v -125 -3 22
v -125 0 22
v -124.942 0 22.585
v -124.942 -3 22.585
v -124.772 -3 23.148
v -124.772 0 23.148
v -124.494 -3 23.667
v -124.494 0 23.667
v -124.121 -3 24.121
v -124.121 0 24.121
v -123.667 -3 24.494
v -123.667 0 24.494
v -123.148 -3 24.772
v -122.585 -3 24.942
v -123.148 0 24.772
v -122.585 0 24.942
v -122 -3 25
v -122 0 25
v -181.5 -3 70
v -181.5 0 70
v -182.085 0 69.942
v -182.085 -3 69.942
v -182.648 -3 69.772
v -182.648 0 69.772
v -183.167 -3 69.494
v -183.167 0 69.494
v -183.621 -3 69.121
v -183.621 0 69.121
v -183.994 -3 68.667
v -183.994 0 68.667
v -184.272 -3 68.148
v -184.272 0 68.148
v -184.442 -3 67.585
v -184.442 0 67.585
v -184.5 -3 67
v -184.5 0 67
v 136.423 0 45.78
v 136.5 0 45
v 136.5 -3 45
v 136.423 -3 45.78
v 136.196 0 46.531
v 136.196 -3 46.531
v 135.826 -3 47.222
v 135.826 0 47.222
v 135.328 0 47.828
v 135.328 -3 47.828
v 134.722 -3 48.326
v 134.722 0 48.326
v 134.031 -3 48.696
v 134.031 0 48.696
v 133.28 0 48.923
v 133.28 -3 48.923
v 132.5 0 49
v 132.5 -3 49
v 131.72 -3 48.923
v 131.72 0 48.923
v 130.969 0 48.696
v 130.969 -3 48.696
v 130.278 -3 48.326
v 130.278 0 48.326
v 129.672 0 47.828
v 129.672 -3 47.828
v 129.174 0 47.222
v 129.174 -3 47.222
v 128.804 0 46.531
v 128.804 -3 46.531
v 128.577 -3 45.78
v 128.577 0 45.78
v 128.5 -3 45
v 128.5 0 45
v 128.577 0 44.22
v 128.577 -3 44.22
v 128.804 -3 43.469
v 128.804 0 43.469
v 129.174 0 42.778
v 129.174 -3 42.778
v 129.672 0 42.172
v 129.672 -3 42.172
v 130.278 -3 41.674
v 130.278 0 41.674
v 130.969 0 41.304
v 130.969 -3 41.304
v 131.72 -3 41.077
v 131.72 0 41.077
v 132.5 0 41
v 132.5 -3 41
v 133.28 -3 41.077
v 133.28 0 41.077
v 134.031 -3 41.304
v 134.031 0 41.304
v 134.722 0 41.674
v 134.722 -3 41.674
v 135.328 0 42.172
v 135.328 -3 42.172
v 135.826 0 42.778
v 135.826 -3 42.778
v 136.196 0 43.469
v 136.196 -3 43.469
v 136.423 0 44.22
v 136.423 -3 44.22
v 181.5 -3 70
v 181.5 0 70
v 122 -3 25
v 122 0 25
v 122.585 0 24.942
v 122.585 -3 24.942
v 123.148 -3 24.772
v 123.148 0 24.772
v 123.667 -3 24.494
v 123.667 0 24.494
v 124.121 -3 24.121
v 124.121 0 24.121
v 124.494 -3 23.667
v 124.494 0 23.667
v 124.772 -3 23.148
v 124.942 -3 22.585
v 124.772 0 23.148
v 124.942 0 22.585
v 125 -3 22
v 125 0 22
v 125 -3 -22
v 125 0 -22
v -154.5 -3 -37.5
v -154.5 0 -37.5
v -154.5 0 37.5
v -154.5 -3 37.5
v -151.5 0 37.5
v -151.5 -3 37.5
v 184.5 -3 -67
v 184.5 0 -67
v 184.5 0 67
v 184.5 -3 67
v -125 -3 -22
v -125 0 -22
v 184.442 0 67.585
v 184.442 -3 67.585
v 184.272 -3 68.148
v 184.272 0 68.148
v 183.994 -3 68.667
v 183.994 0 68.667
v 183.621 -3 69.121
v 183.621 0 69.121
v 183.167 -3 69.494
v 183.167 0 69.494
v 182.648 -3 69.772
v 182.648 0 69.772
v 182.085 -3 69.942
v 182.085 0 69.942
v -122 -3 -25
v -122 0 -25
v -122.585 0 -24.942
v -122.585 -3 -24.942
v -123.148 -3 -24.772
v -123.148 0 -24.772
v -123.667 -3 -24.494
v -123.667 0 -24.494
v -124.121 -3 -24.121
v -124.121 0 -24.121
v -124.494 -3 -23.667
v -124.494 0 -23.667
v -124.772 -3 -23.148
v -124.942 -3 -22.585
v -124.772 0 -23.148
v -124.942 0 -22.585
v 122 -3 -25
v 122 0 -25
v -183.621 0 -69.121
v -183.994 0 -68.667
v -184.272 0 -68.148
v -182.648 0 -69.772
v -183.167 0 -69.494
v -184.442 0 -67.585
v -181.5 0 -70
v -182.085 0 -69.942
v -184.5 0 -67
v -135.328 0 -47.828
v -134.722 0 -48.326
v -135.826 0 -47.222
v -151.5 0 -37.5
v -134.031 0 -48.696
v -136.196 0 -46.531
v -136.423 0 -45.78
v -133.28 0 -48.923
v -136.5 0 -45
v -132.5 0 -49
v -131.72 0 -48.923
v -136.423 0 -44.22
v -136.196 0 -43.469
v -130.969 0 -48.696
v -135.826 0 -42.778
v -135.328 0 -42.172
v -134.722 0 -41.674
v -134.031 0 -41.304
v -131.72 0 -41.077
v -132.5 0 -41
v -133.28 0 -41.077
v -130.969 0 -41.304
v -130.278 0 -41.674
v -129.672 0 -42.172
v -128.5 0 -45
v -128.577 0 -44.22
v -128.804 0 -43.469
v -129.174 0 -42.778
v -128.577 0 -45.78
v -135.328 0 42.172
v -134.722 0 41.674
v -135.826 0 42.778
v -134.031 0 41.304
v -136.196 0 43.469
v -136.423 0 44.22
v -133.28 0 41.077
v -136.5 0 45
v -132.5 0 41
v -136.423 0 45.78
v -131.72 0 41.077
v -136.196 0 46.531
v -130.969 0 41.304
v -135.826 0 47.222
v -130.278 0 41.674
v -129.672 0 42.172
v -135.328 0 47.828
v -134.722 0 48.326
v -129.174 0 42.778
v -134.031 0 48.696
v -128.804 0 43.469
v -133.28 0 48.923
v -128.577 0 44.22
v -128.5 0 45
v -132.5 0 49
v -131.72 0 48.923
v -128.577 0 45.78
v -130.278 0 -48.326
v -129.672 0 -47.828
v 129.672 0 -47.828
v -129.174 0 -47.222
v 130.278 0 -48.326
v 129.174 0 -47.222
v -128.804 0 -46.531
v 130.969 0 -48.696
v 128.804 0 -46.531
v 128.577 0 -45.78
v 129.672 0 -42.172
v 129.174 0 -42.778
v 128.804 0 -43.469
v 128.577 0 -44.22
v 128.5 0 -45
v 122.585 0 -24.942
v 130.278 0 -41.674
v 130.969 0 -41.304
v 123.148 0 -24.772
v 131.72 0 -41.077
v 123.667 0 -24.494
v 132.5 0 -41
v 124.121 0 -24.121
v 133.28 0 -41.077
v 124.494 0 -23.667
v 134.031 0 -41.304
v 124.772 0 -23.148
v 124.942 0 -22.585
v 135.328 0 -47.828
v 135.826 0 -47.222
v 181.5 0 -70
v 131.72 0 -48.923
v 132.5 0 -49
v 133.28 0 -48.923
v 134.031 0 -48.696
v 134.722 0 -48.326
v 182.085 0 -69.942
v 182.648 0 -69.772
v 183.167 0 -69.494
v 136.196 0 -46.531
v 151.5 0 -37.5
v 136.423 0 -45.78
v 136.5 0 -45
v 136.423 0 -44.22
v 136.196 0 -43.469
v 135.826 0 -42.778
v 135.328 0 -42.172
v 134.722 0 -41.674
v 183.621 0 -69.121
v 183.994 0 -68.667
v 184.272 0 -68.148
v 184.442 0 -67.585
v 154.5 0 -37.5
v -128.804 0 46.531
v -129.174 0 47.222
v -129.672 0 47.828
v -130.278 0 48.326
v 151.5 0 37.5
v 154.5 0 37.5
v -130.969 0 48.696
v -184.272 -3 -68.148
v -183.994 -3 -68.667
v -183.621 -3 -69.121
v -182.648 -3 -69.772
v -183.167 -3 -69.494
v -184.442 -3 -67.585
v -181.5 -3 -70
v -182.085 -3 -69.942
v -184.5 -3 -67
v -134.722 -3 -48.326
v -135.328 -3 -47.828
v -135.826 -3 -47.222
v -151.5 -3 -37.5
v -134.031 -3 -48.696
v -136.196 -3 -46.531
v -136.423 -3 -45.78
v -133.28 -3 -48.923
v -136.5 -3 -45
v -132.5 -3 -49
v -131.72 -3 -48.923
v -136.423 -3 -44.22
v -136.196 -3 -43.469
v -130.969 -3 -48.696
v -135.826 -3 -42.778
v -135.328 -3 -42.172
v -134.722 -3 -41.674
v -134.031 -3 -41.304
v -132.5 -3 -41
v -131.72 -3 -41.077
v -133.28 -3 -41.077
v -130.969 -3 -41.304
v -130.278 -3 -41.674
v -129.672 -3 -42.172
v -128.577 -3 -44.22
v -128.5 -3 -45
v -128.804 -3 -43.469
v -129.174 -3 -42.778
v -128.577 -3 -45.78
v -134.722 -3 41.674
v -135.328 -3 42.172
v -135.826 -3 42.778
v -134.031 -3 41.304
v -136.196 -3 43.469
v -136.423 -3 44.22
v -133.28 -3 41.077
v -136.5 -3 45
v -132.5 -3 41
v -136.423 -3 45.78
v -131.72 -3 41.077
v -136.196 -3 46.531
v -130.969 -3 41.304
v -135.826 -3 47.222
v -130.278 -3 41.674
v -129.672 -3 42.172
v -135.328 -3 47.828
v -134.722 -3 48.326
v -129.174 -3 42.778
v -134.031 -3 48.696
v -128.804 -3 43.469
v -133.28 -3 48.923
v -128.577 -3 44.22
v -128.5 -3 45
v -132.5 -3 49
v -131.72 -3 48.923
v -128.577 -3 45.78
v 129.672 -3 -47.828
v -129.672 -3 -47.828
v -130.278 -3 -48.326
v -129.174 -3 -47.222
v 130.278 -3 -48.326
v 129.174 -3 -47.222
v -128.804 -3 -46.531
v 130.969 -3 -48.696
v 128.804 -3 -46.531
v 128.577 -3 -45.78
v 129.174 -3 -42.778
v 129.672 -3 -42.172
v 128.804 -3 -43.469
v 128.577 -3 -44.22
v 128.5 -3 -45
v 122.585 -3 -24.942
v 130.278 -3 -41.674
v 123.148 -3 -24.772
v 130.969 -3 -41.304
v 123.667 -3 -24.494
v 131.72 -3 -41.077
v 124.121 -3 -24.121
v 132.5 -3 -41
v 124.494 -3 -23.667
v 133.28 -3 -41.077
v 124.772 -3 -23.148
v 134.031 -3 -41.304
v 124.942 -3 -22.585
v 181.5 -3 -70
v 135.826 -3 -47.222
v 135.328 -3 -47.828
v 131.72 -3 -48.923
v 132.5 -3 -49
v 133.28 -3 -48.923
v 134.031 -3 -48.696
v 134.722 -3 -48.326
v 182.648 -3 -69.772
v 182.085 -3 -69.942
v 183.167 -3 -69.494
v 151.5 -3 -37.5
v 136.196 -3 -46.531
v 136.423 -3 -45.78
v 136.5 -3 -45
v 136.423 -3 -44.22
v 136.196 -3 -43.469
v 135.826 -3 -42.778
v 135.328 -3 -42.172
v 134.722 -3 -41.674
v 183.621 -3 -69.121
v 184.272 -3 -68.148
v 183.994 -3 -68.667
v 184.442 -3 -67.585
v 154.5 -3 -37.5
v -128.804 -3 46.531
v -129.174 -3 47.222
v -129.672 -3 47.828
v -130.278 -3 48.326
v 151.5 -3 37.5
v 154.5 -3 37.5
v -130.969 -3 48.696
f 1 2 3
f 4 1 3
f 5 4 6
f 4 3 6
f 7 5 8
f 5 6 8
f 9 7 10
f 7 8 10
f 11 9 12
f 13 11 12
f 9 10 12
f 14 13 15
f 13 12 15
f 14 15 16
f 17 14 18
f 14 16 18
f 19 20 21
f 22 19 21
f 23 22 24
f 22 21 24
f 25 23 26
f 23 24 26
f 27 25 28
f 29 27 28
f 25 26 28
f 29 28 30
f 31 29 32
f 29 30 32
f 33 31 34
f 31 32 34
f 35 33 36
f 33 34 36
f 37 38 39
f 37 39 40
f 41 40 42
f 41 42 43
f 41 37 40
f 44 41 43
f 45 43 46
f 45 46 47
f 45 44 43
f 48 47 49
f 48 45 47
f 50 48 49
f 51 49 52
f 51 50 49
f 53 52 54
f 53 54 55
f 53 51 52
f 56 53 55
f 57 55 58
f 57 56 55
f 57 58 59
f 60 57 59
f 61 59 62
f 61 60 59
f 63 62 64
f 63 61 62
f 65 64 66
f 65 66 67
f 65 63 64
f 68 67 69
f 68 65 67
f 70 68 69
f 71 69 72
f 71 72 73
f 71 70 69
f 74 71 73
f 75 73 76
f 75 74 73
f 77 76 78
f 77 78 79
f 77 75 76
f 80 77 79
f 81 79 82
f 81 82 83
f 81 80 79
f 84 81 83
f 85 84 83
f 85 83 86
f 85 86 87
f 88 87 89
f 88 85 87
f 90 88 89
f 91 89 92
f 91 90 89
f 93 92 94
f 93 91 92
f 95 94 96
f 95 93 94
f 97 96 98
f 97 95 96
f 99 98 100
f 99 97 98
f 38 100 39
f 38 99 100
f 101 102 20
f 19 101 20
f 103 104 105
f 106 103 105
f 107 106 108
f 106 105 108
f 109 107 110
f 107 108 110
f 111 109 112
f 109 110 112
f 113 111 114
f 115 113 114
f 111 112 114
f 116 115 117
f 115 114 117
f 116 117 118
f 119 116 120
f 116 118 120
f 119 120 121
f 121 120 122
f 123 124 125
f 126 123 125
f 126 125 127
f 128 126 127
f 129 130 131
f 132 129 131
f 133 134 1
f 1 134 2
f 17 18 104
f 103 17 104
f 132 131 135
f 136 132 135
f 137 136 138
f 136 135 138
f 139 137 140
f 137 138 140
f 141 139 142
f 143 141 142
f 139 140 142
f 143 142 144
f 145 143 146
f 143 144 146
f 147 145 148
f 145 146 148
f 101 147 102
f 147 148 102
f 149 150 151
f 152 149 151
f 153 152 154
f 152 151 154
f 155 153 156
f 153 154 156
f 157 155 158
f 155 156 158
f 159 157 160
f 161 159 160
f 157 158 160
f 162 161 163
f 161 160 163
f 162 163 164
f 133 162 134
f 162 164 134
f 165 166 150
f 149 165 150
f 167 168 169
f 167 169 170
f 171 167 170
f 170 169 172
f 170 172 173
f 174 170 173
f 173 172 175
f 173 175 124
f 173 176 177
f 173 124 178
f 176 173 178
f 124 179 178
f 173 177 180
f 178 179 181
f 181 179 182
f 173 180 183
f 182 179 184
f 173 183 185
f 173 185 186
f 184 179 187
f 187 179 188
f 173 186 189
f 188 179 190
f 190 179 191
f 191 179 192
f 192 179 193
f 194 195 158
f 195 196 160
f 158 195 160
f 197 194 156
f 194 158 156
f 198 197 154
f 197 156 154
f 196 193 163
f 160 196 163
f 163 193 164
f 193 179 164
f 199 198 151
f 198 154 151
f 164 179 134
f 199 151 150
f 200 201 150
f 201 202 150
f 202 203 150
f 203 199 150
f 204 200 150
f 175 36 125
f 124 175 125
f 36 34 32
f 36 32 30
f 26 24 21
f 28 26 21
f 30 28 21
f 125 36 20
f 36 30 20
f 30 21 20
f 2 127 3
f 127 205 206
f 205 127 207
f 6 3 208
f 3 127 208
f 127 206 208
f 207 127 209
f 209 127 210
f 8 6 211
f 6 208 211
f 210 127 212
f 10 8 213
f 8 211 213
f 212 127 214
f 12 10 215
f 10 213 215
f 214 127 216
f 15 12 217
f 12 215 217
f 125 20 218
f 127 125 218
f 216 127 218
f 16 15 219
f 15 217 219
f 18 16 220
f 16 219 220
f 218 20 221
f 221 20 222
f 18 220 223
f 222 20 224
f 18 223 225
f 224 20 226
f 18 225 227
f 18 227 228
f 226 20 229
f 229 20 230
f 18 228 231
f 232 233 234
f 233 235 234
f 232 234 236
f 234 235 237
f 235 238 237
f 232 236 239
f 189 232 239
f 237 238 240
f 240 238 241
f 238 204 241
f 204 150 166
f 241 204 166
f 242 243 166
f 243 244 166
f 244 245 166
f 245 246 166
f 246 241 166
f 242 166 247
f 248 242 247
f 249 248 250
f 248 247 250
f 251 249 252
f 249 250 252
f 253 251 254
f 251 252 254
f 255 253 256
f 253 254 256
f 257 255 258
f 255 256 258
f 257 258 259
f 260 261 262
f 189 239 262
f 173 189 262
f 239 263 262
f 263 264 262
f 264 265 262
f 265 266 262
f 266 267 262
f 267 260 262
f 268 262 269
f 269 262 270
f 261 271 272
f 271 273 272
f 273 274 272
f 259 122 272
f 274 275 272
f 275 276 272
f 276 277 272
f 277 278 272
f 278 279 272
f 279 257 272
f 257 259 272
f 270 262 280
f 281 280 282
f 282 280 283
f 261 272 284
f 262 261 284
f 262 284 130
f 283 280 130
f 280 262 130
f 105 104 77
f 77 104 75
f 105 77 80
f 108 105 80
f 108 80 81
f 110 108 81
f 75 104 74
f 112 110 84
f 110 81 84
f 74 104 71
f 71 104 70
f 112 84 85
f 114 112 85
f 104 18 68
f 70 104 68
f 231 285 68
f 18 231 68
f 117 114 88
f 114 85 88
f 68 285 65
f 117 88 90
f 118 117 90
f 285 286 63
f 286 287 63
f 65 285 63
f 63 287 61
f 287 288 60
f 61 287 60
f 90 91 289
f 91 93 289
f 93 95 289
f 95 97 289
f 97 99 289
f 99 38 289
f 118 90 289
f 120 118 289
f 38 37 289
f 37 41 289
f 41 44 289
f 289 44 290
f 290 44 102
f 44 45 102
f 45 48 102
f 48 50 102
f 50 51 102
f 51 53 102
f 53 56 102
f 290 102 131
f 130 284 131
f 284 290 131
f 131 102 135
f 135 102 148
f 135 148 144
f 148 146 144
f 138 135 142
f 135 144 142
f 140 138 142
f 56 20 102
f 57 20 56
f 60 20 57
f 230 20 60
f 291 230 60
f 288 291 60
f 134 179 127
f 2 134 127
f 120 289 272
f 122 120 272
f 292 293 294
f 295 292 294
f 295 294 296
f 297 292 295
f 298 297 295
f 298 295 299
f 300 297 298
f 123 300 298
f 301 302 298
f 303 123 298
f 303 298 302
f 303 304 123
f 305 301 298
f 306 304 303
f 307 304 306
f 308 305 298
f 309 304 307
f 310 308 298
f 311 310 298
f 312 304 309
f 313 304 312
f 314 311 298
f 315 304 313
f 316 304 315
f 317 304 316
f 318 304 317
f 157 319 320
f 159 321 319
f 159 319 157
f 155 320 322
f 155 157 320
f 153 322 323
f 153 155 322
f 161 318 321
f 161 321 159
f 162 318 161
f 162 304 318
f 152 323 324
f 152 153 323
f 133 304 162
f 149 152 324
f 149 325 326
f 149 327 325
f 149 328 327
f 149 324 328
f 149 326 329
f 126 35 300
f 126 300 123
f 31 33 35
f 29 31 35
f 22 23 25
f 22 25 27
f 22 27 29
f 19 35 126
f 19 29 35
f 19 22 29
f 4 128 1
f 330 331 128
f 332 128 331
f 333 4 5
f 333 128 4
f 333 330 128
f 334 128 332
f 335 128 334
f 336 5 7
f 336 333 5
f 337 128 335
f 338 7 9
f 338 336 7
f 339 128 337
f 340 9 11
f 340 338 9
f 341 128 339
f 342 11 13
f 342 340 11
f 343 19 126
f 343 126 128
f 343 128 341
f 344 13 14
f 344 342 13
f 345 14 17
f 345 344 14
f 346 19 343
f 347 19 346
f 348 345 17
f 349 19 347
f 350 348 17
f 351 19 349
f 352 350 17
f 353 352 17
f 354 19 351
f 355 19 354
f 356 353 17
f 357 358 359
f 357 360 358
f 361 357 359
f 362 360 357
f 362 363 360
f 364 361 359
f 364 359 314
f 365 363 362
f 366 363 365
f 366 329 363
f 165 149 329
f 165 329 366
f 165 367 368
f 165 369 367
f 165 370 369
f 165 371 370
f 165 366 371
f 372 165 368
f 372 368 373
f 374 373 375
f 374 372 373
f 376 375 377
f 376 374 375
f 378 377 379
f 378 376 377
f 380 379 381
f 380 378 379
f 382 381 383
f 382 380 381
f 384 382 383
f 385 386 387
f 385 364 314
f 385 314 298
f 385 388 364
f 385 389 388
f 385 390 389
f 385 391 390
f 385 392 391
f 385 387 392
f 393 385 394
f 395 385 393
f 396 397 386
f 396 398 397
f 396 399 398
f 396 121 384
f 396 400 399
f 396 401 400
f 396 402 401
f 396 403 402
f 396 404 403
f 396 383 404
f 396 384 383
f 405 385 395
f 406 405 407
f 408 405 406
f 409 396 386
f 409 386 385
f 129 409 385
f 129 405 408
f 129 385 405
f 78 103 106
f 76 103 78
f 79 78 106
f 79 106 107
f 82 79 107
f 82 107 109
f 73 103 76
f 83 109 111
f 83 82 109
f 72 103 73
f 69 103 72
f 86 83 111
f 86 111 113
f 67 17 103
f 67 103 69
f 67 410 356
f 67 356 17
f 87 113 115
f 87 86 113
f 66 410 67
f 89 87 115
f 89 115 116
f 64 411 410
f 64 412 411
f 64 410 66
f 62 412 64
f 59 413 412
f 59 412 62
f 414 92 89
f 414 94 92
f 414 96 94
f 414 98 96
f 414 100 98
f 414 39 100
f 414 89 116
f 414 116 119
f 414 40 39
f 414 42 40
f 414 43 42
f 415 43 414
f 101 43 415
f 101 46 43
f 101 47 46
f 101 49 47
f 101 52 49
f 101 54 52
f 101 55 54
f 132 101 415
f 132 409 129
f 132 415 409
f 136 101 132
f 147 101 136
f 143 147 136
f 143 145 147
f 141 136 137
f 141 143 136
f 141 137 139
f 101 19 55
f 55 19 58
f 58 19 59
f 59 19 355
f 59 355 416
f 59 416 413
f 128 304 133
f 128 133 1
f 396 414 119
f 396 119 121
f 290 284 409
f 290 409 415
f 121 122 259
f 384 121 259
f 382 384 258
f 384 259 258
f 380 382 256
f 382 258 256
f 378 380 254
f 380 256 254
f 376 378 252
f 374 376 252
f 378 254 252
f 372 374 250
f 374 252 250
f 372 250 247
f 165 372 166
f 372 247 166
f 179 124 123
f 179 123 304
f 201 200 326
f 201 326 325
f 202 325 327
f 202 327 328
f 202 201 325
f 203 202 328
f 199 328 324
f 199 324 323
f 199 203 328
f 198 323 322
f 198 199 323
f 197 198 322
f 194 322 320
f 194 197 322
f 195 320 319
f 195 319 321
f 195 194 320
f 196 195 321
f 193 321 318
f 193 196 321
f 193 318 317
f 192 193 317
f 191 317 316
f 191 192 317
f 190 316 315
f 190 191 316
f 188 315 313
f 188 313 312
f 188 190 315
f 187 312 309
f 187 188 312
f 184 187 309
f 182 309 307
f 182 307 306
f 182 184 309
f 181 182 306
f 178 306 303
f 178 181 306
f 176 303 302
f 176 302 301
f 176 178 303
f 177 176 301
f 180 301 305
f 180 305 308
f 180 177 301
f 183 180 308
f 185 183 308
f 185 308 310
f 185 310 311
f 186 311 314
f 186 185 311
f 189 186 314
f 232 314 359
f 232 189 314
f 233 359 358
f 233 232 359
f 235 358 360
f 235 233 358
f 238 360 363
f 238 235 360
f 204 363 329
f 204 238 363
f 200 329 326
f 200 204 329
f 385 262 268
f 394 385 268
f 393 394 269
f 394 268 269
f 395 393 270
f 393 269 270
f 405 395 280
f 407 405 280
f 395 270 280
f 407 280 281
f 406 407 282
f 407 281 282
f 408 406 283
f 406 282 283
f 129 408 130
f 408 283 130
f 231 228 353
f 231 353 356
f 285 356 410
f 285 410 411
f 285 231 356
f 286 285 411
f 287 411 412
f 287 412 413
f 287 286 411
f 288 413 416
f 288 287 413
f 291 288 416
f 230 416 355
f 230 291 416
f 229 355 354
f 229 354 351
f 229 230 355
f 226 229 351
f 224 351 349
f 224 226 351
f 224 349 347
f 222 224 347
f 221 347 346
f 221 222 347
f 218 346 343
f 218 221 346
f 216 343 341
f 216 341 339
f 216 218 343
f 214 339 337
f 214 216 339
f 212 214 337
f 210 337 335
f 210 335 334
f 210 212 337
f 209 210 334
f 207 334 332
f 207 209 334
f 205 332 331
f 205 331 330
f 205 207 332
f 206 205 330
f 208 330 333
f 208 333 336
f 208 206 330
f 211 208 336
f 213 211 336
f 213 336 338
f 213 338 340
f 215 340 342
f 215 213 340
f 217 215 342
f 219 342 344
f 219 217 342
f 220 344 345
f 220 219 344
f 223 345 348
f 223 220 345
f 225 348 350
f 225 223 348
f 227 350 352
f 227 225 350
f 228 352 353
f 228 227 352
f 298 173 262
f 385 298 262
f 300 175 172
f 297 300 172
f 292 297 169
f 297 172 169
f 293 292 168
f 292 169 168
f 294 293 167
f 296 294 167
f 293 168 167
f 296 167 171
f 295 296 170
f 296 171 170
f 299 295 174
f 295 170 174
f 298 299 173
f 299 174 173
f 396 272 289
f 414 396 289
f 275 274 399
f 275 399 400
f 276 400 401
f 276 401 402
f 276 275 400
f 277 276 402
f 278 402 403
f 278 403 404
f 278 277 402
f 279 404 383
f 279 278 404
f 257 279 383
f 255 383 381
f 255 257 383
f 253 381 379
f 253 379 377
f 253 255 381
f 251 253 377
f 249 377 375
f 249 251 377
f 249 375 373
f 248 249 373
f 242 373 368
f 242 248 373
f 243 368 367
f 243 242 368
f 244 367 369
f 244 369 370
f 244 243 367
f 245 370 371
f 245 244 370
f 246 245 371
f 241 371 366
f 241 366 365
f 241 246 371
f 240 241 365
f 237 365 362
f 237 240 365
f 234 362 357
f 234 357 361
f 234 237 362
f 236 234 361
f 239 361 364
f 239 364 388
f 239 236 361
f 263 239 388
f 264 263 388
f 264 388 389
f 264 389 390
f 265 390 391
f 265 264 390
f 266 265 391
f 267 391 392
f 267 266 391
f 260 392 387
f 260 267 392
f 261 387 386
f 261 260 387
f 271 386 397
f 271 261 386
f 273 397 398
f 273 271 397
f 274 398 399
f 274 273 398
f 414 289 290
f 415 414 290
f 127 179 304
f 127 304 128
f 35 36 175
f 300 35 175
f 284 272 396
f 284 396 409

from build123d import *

# Parameters (mm, degrees)
F0_R     = 4
F0_W     = 3
F0_H     = 75
F1_DEPTH = 3


with BuildPart() as f1:
    # F0 (on Front) → F1 (new body)
    with BuildSketch(Plane.XZ):
        with BuildLine():
            Line((-181.5, -70), (181.5, -70))
            ThreePointArc((181.5, -70), (183.62132, -69.12132), (184.5, -67))
            Line((184.5, -67), (184.5, 67))
            ThreePointArc((184.5, 67), (183.62132, 69.12132), (181.5, 70))
            Line((181.5, 70), (-181.5, 70))
            ThreePointArc((-181.5, 70), (-183.62132, 69.12132), (-184.5, 67))
            Line((-184.5, 67), (-184.5, -67))
            ThreePointArc((-184.5, -67), (-183.62132, -69.12132), (-181.5, -70))
        make_face()
        with Locations((-132.5, -45)):
            Circle(F0_R, mode=Mode.SUBTRACT)
        with Locations((132.5, -45)):
            Circle(F0_R, mode=Mode.SUBTRACT)
        with Locations((-153, 0)):
            Rectangle(F0_W, F0_H, mode=Mode.SUBTRACT)
        with Locations((-132.5, 45)):
            Circle(F0_R, mode=Mode.SUBTRACT)
        with BuildLine():
            ThreePointArc((125, -22), (124.12132, -24.12132), (122, -25))
            Line((122, -25), (-122, -25))
            ThreePointArc((-122, -25), (-124.12132, -24.12132), (-125, -22))
            Line((-125, -22), (-125, 22))
            ThreePointArc((-125, 22), (-124.12132, 24.12132), (-122, 25))
            Line((-122, 25), (122, 25))
            ThreePointArc((122, 25), (124.12132, 24.12132), (125, 22))
            Line((125, 22), (125, -22))
        make_face(mode=Mode.SUBTRACT)
        with Locations((153, 0)):
            Rectangle(F0_W, F0_H, mode=Mode.SUBTRACT)
        with Locations((132.5, 45)):
            Circle(F0_R, mode=Mode.SUBTRACT)
    extrude(amount=F1_DEPTH)


solid = f1.part
